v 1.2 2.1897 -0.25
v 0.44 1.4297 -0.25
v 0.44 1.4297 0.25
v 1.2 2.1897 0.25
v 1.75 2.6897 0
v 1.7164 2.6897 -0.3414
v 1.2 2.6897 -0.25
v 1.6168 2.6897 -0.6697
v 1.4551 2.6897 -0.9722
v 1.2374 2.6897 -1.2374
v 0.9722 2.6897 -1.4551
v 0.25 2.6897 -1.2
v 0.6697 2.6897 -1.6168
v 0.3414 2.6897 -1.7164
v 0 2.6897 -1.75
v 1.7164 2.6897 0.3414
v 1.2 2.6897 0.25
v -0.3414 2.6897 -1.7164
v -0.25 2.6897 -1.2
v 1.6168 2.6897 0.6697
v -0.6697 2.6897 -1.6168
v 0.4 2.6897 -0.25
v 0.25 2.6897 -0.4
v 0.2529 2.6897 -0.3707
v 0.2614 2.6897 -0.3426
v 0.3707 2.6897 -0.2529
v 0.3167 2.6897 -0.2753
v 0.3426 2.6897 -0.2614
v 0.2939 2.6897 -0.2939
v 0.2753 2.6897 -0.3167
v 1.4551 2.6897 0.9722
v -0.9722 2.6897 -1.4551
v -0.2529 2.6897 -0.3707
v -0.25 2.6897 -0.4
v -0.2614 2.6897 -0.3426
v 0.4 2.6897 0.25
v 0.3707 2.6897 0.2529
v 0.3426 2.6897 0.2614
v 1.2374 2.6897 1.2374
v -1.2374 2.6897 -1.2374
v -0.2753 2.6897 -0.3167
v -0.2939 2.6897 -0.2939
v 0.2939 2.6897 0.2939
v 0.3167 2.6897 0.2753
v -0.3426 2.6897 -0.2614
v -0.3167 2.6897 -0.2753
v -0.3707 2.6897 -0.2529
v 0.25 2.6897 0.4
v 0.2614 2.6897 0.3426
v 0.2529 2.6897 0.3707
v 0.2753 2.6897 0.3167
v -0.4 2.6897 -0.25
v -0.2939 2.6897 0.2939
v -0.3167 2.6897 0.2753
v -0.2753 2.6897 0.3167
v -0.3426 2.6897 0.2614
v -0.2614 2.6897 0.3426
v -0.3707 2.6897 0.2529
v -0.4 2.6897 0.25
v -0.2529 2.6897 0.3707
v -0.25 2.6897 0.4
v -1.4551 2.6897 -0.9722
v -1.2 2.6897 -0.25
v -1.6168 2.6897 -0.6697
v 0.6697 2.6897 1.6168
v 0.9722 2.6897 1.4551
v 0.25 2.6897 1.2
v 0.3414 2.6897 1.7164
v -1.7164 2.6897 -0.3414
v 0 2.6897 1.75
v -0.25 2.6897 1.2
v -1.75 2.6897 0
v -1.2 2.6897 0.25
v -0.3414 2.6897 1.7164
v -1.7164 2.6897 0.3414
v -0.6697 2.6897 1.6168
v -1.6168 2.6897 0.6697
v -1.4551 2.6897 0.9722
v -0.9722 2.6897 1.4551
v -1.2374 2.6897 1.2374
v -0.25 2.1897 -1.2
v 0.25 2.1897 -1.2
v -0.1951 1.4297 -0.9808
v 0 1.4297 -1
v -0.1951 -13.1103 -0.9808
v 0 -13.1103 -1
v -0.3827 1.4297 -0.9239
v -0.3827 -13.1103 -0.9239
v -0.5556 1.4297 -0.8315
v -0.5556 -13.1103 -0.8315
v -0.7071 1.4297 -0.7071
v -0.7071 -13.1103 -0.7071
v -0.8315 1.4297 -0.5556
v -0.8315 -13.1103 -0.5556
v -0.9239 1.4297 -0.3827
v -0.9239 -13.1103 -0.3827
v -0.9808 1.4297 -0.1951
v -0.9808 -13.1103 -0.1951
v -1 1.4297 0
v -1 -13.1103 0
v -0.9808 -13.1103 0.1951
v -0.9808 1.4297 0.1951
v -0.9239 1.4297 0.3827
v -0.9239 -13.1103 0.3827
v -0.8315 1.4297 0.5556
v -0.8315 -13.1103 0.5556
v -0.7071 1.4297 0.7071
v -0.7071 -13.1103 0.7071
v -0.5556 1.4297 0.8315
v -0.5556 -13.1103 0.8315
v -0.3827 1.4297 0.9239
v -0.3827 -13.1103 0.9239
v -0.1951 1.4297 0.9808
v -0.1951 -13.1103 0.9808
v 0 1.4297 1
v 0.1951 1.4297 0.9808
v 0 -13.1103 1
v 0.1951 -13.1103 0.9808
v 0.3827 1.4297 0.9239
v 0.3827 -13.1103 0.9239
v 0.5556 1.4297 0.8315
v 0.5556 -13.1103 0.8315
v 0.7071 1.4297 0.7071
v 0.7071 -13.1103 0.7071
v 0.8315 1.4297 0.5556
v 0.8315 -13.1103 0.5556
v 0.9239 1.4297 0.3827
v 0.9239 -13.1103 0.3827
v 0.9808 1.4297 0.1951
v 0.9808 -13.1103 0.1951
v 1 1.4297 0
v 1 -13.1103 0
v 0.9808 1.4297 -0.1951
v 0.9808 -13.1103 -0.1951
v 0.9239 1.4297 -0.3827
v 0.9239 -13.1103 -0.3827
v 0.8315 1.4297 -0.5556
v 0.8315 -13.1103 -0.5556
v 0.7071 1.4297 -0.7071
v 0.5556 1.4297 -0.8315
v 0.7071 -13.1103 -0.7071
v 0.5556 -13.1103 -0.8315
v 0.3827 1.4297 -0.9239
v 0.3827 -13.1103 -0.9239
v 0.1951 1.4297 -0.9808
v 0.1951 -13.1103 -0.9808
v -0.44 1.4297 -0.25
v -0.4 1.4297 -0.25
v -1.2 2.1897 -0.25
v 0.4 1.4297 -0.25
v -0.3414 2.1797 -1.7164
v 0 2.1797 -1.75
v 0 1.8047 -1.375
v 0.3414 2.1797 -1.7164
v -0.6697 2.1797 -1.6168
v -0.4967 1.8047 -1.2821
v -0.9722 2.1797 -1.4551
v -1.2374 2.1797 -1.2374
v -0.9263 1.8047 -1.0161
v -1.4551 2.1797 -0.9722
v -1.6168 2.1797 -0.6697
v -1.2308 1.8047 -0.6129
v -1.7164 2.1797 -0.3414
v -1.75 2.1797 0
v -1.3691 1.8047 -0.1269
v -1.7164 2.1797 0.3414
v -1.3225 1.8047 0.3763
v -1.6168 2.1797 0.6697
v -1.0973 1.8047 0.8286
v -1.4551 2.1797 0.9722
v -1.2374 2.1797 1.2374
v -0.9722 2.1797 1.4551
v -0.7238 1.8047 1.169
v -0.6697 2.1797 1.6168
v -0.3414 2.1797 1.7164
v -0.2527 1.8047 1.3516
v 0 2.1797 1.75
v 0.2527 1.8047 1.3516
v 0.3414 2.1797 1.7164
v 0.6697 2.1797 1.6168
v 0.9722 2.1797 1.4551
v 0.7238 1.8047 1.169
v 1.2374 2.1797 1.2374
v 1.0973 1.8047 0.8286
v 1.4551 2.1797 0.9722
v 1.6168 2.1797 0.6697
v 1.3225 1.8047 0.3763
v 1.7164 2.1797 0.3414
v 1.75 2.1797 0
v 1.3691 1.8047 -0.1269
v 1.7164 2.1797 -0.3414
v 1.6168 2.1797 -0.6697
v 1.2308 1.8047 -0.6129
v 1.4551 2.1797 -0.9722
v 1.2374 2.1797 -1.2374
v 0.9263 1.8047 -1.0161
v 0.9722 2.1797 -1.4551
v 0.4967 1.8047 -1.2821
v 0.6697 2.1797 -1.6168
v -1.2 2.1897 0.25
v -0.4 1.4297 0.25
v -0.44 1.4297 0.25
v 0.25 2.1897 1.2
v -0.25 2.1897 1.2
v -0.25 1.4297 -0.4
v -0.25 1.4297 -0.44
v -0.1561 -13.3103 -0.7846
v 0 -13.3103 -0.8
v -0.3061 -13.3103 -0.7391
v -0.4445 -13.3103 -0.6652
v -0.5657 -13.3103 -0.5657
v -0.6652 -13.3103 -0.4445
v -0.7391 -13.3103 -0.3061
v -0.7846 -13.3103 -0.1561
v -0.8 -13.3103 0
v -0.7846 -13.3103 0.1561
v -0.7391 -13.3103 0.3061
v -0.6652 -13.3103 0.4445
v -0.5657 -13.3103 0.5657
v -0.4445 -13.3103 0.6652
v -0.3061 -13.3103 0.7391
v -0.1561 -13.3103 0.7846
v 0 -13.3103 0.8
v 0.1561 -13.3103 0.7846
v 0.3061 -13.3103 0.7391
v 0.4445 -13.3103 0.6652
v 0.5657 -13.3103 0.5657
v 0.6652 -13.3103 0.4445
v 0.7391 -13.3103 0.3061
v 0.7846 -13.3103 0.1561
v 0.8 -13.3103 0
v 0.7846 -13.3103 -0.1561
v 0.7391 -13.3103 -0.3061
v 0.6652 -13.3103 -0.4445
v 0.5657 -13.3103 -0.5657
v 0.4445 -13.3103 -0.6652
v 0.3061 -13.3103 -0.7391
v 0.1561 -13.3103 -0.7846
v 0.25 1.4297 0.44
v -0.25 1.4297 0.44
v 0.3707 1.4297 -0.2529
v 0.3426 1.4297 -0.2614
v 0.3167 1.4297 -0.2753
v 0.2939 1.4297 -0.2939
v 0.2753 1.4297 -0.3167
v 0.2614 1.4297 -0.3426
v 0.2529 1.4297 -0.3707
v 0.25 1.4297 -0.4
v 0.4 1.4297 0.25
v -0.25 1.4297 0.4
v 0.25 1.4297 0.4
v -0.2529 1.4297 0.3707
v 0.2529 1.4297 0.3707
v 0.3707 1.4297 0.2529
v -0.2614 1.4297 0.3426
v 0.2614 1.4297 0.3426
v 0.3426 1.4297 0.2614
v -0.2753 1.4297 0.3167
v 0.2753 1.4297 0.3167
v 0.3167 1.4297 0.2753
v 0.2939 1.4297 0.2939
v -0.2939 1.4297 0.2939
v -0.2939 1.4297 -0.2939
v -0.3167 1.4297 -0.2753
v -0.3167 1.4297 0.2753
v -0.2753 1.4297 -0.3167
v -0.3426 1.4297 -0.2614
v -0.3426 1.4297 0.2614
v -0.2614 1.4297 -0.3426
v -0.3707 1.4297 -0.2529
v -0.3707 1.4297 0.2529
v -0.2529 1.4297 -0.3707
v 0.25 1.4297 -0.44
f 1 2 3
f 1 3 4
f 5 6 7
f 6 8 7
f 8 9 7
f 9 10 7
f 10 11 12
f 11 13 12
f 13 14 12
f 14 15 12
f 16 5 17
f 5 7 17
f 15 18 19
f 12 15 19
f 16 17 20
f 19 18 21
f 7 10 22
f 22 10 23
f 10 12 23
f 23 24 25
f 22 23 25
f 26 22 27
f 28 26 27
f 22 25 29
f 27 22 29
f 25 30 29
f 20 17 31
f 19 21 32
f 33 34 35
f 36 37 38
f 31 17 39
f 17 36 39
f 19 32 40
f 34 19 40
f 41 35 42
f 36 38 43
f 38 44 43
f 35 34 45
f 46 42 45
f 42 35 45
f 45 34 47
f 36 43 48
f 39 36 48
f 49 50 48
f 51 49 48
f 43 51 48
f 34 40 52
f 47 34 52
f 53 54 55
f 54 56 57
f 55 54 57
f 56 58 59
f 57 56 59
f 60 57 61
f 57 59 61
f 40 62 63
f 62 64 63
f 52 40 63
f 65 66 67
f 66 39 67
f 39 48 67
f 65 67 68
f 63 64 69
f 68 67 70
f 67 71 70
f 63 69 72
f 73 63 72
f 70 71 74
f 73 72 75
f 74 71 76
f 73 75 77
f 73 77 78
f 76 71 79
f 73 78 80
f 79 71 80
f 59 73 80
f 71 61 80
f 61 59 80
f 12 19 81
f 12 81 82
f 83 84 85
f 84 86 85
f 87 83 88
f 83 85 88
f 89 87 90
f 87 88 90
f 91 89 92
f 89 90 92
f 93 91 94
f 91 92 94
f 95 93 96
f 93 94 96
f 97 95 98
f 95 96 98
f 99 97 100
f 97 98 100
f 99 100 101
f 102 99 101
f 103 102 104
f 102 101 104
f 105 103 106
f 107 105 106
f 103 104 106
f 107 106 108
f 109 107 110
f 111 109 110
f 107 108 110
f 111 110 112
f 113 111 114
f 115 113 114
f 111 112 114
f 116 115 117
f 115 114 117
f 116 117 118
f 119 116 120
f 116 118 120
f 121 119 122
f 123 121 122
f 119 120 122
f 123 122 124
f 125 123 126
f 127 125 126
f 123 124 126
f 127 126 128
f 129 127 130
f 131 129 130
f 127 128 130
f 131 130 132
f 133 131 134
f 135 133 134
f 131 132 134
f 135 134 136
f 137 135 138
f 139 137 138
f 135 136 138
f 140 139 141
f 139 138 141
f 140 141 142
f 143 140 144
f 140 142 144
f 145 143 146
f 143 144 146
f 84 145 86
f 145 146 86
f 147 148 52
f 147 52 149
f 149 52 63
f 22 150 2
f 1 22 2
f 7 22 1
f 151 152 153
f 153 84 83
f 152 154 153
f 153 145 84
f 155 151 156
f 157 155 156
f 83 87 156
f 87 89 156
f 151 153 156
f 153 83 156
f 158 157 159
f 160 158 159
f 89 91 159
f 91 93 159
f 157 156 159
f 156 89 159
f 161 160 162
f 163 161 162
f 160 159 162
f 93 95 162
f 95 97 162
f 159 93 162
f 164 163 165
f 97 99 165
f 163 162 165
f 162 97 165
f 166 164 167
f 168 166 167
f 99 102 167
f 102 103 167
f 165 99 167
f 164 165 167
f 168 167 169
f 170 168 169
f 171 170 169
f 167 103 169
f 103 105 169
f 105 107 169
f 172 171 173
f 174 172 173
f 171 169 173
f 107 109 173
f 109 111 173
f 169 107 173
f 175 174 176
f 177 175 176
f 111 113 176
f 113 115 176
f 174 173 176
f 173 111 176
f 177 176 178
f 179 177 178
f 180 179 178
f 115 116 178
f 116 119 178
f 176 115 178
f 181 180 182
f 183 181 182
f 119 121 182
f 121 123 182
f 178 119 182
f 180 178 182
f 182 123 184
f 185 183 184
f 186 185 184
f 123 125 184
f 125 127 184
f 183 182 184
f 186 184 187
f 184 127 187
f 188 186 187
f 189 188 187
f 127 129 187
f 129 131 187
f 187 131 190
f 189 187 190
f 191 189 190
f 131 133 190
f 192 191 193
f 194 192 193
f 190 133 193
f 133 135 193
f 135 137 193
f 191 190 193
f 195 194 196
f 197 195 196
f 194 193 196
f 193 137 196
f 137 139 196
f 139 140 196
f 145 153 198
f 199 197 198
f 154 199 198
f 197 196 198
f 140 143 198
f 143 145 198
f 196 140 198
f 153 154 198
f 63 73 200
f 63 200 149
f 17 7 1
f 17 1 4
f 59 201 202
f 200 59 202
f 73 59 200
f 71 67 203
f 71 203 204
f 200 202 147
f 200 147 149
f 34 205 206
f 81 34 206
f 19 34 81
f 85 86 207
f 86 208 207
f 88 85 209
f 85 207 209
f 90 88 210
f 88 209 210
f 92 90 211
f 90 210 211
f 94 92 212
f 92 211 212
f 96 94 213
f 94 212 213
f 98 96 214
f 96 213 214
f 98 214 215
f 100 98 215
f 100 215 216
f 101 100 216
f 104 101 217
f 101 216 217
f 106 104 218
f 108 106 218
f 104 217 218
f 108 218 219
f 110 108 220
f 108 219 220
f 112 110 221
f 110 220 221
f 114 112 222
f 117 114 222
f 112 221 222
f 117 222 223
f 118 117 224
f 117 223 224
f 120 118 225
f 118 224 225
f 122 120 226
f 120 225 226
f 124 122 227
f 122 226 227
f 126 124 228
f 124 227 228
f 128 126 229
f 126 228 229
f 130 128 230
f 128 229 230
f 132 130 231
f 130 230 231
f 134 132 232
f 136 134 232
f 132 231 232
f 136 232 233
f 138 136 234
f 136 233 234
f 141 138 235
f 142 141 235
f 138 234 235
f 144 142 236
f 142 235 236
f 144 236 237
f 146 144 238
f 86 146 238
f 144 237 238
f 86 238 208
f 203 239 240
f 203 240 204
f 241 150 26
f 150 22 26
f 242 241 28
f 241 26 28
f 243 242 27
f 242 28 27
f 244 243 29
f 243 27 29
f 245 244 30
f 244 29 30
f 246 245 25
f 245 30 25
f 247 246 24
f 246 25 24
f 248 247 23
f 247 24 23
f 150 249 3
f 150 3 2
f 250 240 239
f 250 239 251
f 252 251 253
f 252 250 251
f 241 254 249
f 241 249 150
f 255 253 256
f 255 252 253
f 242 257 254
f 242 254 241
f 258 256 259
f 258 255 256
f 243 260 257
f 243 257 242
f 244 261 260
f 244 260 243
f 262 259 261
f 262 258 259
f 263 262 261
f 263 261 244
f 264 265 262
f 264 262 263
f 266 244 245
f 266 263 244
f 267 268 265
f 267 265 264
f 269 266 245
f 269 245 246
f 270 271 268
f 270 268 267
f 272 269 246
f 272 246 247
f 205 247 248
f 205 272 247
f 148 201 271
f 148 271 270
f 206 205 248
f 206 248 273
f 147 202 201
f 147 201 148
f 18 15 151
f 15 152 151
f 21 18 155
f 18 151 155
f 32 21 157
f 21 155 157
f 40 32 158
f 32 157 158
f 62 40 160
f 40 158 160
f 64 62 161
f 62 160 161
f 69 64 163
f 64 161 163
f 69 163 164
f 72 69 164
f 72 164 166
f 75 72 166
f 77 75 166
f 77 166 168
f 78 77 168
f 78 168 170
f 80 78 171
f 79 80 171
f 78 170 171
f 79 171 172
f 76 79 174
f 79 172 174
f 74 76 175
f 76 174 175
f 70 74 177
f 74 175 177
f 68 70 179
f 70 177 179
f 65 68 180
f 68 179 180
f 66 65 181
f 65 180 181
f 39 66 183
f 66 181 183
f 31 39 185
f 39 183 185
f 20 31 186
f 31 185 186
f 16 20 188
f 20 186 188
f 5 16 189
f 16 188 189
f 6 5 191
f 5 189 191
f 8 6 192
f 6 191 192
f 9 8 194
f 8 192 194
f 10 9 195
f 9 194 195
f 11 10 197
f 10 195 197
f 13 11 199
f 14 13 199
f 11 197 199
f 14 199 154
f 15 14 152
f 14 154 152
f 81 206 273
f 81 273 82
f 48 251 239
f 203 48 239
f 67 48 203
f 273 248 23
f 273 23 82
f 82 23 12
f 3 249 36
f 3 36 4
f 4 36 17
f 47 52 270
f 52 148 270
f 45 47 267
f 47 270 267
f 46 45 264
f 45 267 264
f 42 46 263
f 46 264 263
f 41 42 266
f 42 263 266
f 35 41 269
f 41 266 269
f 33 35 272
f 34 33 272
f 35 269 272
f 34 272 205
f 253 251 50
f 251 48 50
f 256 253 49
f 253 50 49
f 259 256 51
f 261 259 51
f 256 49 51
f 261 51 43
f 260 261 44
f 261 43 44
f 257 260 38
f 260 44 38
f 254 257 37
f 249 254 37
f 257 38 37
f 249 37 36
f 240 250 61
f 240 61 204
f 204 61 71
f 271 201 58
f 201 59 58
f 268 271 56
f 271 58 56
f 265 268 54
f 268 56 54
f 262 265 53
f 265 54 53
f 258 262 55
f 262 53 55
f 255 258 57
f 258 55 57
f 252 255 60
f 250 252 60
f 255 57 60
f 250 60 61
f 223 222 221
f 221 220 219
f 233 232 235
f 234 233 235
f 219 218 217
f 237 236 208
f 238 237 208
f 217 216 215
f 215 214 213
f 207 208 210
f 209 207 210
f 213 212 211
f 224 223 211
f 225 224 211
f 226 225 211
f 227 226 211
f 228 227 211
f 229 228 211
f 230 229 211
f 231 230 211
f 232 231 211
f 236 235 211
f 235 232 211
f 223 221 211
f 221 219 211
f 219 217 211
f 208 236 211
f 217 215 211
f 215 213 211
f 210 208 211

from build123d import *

# Parameters (mm, degrees)
SKETCH_2_W               = 0.5
SKETCH_2_H               = 1.2
CUT_EXTRUDE_1_DEPTH      = 0.5
CUT_EXTRUDE_2_DEPTH      = 0.5
PATTERN_CIRCULAR_1_COUNT = 4
FILLET_1_R               = 0.15


with BuildPart() as part:
    # 草图1 → 旋转1 (revolve)
    with BuildSketch(Plane.XY, mode=Mode.PRIVATE) as revolve_1_sk:
        Polygon((0, 2.689659811), (-1.75, 2.689659811), (-1.75, 2.179659811), (-1, 1.429659811), (-1, -13.110340189), (-0.8, -13.310340189), (0, -13.310340189), align=None)
    revolve(revolve_1_sk.sketch.rotate(Axis((0, -3.769198969, 0), (0, 1, 0)), 270), axis=Axis((0, -3.769198969, 0), (0, 1, 0)))

    # 草图2 → 切除-拉伸1 (cut)
    with BuildSketch(Plane(origin=(0, 2.689659811, 0), x_dir=(1, 0, 0), z_dir=(0, 1, 0))):
        with Locations((0, 0.6)):
            Rectangle(SKETCH_2_W, SKETCH_2_H)
    cut_extrude_1 = extrude(amount=-CUT_EXTRUDE_1_DEPTH, mode=Mode.SUBTRACT)

    # 草图3 → 切除-拉伸2 (cut)
    with BuildSketch(Plane(origin=(-0.25, 0, 0), x_dir=(0, 0, -1), z_dir=(1, 0, 0))):
        Polygon((0, 2.189659811), (0, 1.429659811), (0.44, 1.429659811), (1.2, 2.189659811), align=None)
    cut_extrude_2 = extrude(amount=CUT_EXTRUDE_2_DEPTH, mode=Mode.SUBTRACT)

    # 阵列(圆周)1: 切除-拉伸1, 切除-拉伸2 ×4 about axis
    pattern_circular_1_axis = Axis((0, 0, 0), (0, 1, 0))
    add([cut_extrude_1.rotate(pattern_circular_1_axis, i * 360 / PATTERN_CIRCULAR_1_COUNT) for i in range(1, PATTERN_CIRCULAR_1_COUNT)], mode=Mode.SUBTRACT)
    add([cut_extrude_2.rotate(pattern_circular_1_axis, i * 360 / PATTERN_CIRCULAR_1_COUNT) for i in range(1, PATTERN_CIRCULAR_1_COUNT)], mode=Mode.SUBTRACT)

    # 圆角1
    fillet_1_edges = [part.edges().sort_by_distance(p)[0] for p in [
        (0.25, 2.059659811, -0.25),
        (-0.25, 2.059659811, -0.25),
        (0.25, 2.059659811, 0.25),
        (-0.25, 2.059659811, 0.25),
    ]]
    fillet(fillet_1_edges, radius=FILLET_1_R)


solid = part.part
